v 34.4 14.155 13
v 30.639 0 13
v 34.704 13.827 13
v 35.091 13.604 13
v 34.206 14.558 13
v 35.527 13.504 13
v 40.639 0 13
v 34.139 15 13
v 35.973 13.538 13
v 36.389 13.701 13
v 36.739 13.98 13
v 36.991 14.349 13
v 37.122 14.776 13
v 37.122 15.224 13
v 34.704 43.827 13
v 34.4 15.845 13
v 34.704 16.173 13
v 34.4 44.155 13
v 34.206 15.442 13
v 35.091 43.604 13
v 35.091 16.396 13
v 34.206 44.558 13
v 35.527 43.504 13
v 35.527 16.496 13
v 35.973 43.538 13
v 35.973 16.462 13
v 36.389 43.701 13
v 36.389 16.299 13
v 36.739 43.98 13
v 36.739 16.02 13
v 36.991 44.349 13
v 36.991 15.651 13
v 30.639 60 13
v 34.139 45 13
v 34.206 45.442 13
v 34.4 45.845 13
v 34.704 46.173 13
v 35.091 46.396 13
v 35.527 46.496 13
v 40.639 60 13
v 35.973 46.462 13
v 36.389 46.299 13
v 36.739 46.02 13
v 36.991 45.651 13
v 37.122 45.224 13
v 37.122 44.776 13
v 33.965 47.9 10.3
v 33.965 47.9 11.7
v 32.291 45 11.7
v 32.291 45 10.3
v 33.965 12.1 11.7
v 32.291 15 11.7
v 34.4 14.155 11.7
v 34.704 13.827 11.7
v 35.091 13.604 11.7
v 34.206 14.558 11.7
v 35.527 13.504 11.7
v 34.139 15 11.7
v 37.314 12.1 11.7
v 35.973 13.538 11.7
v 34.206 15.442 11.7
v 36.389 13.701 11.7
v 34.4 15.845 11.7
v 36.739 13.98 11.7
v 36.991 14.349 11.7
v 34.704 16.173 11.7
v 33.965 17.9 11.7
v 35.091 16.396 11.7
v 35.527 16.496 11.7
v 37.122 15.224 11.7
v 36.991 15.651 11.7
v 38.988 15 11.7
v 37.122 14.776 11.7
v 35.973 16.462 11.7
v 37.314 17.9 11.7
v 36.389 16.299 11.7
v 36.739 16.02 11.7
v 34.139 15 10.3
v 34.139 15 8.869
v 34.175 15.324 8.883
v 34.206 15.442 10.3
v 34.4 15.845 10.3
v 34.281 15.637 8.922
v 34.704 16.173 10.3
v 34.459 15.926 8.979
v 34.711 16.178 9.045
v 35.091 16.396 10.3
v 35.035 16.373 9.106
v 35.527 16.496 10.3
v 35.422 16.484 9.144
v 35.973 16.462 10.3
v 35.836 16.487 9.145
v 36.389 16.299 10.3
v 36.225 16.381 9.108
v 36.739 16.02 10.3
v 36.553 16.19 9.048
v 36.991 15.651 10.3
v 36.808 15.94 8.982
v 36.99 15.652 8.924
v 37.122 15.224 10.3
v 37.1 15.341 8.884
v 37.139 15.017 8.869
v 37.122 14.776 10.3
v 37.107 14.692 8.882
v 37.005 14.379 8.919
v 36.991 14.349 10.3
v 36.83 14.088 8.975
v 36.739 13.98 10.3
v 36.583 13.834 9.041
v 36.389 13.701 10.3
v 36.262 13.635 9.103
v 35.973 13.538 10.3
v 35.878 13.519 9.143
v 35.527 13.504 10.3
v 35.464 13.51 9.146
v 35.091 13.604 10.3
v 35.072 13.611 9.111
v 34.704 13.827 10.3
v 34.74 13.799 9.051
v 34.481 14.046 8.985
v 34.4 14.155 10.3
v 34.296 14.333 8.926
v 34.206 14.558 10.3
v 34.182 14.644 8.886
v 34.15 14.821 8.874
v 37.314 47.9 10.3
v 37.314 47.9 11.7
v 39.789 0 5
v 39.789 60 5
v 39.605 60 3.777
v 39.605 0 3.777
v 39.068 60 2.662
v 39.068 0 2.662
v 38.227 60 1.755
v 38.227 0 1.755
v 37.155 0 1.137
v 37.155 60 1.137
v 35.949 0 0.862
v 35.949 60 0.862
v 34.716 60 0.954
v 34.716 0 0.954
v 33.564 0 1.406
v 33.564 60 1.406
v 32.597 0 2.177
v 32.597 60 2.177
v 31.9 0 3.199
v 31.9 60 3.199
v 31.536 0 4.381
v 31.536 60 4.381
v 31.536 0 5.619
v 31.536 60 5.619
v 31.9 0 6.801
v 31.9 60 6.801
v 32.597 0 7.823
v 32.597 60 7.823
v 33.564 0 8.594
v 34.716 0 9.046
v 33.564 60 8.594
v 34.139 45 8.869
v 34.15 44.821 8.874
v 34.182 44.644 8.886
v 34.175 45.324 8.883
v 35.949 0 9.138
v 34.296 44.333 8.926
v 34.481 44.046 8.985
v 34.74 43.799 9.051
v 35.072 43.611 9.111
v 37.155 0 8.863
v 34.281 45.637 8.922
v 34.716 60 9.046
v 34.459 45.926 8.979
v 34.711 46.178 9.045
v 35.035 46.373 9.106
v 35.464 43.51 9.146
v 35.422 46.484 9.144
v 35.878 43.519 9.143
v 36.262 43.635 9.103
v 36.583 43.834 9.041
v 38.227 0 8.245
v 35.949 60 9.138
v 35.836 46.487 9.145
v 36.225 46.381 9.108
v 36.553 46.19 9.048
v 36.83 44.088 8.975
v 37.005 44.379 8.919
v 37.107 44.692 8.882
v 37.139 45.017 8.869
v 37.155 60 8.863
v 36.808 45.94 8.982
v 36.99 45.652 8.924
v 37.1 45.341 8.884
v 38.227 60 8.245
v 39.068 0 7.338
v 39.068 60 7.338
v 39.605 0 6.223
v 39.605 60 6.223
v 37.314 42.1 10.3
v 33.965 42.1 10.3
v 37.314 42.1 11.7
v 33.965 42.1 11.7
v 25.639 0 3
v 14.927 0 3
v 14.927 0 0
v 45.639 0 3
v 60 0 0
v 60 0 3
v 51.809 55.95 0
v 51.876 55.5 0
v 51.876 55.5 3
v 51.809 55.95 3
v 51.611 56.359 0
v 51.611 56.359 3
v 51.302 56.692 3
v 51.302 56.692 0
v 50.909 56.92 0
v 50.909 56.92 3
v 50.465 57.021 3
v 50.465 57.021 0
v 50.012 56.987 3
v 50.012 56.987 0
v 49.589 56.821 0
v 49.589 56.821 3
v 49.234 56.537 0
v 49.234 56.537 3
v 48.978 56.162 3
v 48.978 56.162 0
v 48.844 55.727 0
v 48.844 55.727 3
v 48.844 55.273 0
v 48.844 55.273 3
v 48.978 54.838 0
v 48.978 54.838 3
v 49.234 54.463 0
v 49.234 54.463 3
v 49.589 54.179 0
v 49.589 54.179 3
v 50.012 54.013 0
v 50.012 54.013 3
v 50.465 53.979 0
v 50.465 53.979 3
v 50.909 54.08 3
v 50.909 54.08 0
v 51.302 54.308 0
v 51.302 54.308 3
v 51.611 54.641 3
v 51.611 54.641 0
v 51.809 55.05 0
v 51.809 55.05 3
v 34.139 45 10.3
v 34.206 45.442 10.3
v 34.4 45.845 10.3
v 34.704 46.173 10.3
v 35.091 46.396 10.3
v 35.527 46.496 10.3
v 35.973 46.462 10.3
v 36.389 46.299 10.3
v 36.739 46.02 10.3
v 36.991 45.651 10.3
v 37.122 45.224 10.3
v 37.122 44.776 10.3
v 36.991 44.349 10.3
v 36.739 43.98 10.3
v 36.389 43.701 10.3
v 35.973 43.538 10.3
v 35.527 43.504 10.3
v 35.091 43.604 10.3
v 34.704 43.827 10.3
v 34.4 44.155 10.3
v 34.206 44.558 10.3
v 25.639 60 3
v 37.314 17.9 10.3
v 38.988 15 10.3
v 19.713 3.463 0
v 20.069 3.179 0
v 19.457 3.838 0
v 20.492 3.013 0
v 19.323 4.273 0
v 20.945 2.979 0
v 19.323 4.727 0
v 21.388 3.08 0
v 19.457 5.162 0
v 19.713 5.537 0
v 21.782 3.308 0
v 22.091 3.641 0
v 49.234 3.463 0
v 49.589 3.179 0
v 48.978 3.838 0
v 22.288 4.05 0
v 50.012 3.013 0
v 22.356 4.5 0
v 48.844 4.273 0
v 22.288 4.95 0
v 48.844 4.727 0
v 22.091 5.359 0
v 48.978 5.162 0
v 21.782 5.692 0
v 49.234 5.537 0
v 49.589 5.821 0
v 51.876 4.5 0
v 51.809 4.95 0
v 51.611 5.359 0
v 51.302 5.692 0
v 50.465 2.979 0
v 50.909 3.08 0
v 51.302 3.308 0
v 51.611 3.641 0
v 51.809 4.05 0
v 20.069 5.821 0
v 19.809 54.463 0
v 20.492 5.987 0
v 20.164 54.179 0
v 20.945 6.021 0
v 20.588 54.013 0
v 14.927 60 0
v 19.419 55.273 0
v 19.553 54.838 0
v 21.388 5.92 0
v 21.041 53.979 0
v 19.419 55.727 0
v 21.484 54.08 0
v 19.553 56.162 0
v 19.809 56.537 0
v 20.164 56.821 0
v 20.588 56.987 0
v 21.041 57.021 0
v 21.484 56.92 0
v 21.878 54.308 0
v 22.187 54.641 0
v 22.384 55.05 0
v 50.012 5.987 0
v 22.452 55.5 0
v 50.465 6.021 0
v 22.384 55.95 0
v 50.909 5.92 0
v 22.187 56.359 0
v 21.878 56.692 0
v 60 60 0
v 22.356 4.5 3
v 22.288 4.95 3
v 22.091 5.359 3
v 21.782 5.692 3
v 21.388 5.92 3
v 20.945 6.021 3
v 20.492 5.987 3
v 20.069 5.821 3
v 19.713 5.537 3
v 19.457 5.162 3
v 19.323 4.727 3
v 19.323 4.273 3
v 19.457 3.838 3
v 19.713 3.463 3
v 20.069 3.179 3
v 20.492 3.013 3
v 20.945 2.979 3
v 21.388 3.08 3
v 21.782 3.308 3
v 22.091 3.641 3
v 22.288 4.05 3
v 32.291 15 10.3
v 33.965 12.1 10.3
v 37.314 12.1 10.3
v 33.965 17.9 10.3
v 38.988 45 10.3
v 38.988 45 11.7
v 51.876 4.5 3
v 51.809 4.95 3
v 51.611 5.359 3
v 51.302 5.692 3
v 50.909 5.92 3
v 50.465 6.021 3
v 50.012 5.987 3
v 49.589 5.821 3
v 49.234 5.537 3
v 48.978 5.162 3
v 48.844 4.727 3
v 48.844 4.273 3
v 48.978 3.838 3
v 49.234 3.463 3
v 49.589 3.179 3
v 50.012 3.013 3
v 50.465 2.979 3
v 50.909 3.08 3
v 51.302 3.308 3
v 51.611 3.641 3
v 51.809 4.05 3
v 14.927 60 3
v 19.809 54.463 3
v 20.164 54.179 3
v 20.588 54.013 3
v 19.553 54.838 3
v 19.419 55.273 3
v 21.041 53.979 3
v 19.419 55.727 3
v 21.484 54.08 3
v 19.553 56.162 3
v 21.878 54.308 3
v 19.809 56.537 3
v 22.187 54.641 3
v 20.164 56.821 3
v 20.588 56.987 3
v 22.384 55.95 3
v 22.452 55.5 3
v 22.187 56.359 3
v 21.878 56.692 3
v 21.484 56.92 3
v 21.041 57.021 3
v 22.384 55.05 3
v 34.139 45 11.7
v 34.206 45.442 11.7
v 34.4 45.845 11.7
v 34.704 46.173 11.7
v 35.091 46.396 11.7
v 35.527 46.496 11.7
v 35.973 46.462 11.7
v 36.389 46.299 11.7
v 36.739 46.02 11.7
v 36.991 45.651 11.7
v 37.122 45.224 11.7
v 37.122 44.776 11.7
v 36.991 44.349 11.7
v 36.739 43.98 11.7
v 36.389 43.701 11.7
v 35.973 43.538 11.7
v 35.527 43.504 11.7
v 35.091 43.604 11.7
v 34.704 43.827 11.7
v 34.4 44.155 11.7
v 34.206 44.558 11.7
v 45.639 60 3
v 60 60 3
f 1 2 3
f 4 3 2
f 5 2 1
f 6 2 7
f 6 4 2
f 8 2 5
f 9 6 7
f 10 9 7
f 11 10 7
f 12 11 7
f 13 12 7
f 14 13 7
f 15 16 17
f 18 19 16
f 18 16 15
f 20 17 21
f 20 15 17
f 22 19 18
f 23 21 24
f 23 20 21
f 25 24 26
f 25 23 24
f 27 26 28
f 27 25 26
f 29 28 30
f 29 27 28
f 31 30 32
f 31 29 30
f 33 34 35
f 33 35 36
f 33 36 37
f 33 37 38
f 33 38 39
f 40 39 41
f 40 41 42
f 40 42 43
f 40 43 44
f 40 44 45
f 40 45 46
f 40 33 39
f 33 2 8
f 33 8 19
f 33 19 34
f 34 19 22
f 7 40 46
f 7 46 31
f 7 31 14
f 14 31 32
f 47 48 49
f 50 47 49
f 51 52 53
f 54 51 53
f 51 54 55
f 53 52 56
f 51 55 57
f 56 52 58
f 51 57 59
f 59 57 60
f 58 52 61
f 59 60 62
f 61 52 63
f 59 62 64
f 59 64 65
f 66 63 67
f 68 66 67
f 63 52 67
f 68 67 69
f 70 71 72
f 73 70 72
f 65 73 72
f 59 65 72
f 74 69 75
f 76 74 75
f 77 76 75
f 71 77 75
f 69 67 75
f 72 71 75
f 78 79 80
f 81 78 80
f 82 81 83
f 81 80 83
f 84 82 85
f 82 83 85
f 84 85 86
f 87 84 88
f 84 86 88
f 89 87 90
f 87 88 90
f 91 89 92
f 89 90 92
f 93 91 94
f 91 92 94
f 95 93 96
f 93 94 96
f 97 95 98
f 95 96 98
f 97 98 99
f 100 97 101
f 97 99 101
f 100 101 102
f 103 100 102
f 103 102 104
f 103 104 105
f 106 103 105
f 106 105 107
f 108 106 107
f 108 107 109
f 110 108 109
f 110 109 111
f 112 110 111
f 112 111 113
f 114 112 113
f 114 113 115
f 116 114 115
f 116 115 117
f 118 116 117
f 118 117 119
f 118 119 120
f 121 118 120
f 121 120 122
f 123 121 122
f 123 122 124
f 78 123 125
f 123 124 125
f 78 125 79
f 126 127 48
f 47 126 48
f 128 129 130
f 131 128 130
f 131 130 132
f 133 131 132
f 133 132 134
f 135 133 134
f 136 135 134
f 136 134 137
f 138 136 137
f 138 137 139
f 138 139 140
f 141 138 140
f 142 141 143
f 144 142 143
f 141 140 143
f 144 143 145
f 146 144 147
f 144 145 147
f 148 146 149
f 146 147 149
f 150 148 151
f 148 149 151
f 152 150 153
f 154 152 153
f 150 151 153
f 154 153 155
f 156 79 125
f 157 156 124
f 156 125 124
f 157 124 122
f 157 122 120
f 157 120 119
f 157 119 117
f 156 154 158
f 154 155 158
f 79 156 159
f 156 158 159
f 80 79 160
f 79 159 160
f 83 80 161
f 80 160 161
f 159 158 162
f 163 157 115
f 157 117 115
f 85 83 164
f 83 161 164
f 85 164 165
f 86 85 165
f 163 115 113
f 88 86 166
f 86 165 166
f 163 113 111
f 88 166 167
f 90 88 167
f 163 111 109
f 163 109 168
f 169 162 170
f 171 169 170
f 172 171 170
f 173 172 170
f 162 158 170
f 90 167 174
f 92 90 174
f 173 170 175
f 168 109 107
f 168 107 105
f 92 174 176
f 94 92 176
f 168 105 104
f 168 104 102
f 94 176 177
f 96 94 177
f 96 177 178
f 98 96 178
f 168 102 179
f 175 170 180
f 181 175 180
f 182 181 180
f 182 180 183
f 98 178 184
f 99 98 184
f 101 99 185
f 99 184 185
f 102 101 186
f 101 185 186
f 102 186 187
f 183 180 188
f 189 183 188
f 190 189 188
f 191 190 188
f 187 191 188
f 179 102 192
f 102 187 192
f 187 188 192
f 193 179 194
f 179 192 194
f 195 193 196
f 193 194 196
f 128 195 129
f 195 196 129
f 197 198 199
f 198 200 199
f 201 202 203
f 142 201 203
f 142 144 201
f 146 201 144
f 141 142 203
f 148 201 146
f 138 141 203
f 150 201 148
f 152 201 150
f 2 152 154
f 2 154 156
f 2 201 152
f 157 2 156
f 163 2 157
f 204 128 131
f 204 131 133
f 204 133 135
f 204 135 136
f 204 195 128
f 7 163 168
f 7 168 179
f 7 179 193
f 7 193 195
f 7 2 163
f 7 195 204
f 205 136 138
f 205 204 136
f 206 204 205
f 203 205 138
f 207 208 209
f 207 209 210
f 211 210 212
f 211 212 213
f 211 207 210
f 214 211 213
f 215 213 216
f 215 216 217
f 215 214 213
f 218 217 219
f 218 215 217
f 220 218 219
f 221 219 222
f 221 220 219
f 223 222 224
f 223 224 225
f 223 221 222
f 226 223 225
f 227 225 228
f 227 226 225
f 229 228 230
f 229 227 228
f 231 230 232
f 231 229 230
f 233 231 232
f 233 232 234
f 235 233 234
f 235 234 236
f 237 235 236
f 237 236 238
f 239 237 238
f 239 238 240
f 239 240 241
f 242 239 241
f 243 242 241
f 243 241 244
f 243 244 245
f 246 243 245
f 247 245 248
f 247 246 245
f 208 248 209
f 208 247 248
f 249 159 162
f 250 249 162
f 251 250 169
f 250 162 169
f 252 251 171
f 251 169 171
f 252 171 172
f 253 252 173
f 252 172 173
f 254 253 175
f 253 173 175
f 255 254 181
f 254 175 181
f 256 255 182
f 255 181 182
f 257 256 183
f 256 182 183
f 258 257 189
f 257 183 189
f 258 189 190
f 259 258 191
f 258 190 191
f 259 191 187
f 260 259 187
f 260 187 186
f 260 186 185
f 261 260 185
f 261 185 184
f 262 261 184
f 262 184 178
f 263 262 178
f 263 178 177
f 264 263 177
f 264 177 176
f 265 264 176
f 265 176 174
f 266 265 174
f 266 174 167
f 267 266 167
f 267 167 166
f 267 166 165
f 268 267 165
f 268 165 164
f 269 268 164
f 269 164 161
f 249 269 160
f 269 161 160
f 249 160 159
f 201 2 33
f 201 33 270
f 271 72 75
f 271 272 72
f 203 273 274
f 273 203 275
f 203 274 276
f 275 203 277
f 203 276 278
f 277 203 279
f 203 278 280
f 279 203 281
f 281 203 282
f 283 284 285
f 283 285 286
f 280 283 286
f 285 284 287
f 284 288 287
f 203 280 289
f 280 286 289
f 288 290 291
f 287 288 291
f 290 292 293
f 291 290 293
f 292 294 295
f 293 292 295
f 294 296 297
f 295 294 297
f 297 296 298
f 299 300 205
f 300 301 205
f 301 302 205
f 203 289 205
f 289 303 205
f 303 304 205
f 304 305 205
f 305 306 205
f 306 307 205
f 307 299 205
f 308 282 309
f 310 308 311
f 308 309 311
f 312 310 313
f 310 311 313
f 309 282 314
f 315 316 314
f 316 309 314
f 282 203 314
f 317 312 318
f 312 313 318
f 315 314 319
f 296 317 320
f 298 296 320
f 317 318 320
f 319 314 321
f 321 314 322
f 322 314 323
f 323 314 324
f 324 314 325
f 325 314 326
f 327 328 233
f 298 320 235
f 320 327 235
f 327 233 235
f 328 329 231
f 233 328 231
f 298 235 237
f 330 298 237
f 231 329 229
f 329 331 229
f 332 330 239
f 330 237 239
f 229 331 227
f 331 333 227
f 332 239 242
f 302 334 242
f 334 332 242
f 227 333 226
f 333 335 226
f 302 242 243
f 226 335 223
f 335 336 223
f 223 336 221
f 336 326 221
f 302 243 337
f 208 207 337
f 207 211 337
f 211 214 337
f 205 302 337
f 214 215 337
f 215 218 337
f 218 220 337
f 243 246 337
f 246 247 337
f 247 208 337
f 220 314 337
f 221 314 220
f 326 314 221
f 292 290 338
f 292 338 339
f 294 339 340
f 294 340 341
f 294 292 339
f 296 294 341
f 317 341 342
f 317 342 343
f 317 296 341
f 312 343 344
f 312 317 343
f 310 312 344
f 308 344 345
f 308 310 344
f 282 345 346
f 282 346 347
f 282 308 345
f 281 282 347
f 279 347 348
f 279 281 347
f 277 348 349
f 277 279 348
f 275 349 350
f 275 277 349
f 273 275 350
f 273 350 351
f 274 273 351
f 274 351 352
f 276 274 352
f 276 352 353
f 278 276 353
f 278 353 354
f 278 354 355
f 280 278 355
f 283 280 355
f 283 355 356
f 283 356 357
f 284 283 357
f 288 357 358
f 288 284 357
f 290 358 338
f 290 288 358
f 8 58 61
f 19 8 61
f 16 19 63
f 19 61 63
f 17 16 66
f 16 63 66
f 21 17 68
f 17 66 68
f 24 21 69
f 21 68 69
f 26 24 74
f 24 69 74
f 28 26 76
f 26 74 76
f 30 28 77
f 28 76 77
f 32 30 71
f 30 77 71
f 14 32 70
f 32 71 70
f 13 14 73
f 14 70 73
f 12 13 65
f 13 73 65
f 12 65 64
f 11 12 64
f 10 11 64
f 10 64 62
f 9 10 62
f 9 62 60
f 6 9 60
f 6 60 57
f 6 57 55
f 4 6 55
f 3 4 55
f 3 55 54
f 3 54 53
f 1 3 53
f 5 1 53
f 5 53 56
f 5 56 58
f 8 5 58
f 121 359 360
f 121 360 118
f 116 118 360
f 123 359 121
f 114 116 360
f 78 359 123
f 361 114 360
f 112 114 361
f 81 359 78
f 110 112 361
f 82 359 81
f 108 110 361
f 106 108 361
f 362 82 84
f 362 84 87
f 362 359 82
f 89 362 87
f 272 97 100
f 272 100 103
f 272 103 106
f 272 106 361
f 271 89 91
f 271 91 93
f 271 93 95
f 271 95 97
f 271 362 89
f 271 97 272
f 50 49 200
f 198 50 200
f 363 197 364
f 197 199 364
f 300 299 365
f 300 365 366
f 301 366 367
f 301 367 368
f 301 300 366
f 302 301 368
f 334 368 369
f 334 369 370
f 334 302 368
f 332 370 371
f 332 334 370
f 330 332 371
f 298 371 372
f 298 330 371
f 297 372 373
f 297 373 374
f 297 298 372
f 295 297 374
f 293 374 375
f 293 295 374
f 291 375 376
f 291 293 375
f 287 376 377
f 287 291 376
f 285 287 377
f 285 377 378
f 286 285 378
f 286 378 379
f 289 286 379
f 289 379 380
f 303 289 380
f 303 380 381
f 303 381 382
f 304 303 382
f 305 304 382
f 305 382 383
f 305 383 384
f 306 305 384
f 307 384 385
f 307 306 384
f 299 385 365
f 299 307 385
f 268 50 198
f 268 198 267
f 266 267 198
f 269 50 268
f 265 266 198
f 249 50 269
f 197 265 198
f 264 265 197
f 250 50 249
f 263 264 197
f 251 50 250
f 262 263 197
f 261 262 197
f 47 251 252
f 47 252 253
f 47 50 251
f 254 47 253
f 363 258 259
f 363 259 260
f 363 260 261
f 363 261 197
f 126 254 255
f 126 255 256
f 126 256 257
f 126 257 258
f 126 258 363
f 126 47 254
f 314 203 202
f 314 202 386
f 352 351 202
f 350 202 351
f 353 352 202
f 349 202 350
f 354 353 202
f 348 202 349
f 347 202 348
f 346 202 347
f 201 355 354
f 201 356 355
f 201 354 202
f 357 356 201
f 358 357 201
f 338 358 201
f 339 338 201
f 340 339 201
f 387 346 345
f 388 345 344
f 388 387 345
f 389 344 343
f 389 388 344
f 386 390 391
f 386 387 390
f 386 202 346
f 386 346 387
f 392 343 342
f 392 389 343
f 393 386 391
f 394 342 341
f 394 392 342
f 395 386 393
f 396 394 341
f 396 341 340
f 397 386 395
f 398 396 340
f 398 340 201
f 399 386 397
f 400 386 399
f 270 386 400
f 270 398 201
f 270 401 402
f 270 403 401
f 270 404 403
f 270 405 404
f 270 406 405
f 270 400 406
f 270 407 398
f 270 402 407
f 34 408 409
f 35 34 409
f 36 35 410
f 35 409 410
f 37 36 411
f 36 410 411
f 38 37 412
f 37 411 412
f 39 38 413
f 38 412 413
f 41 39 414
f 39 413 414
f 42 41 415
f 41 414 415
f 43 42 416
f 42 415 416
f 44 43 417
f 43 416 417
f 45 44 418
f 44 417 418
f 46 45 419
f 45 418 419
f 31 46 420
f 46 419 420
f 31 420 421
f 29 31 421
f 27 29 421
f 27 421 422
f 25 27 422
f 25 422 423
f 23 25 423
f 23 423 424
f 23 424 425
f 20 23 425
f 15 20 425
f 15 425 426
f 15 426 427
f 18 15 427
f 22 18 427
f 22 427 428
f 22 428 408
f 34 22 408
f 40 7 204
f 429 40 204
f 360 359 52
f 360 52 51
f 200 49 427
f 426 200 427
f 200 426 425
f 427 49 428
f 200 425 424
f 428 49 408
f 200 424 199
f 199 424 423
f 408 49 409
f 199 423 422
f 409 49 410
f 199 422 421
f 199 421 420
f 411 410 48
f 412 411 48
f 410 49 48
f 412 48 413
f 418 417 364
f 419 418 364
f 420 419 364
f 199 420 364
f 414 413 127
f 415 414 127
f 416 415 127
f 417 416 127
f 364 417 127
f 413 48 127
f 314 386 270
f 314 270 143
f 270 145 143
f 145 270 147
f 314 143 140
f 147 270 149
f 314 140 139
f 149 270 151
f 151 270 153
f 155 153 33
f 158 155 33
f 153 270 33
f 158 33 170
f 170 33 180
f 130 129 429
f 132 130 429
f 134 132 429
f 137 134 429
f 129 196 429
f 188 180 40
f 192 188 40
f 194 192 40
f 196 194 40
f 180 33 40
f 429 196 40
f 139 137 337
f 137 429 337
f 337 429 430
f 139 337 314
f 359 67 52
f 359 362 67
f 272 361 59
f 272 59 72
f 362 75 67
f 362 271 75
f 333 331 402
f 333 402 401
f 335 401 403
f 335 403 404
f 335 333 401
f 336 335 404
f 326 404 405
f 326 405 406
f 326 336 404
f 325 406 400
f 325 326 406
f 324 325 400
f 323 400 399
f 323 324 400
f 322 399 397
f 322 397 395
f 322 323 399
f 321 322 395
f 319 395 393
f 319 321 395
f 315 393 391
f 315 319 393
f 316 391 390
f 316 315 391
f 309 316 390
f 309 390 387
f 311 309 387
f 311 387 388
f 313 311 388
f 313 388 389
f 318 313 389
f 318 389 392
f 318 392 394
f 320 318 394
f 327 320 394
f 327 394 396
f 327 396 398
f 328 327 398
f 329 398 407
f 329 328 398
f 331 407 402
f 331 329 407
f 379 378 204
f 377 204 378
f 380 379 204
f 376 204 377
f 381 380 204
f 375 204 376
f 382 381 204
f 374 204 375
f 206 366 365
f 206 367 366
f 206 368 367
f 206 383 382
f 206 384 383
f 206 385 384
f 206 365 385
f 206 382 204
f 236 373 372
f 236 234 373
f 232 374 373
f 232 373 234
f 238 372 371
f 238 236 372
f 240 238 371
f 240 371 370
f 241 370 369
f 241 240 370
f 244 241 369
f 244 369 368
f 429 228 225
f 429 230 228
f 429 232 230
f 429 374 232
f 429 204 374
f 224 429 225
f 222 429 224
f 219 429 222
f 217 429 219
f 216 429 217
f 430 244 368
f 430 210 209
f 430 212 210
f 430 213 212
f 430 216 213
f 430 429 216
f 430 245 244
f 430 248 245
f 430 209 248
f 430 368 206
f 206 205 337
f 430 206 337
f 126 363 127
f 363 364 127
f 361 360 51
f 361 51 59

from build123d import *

# Parameters (mm, degrees)
SKETCH_1_W          = 45.073019954
SKETCH_1_H          = 60
SKETCH_1_R          = 1.525
EXTRUDE_1_DEPTH     = 3
SKETCH_2_W          = 10
SKETCH_2_H          = 60
EXTRUDE_2_DEPTH     = 10
HOLE_WIZARD_1_D     = 8.3
EXTRUDE_3_DEPTH     = 60
CUT_EXTRUDE_1_DEPTH = 0.7
HOLE_WIZARD_2_D     = 3
HOLE_WIZARD_2_DEPTH = 5


with BuildPart() as part:
    # 草图1 → 凸台-拉伸1 (new body)
    with BuildSketch(Plane.XY):
        with Locations((37.463490023, 30)):
            Rectangle(SKETCH_1_W, SKETCH_1_H)
        with Locations((20.831064203, 4.5)):
            Circle(SKETCH_1_R, mode=Mode.SUBTRACT)
        with Locations((50.351484989, 4.5)):
            Circle(SKETCH_1_R, mode=Mode.SUBTRACT)
        with Locations((20.926980046, 55.5)):
            Circle(SKETCH_1_R, mode=Mode.SUBTRACT)
        with Locations((50.351484989, 55.5)):
            Circle(SKETCH_1_R, mode=Mode.SUBTRACT)
    extrude(amount=EXTRUDE_1_DEPTH)

    # 草图2 → 凸台-拉伸2 (add)
    with BuildSketch(Plane.XY.offset(3)):
        with Locations((35.639232517, 30)):
            Rectangle(SKETCH_2_W, SKETCH_2_H)
    extrude(amount=EXTRUDE_2_DEPTH)

    # 孔1 (through all)
    with Locations(Plane(origin=(0, 0, 0), x_dir=(-1, 0, 0), z_dir=(0, -1, 0))):
        with Locations((-35.639232517, -5)):
            Hole(HOLE_WIZARD_1_D / 2)

    # 草图5 → 凸台-拉伸3 (add)
    with BuildSketch(Plane.XZ):
        Polygon((30.639232517, 13), (25.639232517, 3), (30.639232517, 3), align=None)
        Polygon((40.639232517, 13), (45.639232517, 3), (40.639232517, 3), align=None)
    extrude(amount=-EXTRUDE_3_DEPTH)

    # 草图7 → 切除-拉伸1 (cut, symmetric)
    with BuildSketch(Plane.XY.offset(11)):
        Polygon((37.313548298, 12.1), (38.987864079, 15), (37.313548298, 17.9), (33.964916737, 17.9), (32.290600956, 15), (33.964916737, 12.1), align=None)
        Polygon((38.987864079, 45), (37.313548298, 47.9), (33.964916737, 47.9), (32.290600956, 45), (33.964916737, 42.1), (37.313548298, 42.1), align=None)
    extrude(amount=CUT_EXTRUDE_1_DEPTH, both=True, mode=Mode.SUBTRACT)

    # 孔2
    with Locations(Plane.XY.offset(13)):
        with Locations((35.639232517, 45), (35.639232517, 15)):
            Hole(HOLE_WIZARD_2_D / 2, depth=HOLE_WIZARD_2_DEPTH)


solid = part.part
